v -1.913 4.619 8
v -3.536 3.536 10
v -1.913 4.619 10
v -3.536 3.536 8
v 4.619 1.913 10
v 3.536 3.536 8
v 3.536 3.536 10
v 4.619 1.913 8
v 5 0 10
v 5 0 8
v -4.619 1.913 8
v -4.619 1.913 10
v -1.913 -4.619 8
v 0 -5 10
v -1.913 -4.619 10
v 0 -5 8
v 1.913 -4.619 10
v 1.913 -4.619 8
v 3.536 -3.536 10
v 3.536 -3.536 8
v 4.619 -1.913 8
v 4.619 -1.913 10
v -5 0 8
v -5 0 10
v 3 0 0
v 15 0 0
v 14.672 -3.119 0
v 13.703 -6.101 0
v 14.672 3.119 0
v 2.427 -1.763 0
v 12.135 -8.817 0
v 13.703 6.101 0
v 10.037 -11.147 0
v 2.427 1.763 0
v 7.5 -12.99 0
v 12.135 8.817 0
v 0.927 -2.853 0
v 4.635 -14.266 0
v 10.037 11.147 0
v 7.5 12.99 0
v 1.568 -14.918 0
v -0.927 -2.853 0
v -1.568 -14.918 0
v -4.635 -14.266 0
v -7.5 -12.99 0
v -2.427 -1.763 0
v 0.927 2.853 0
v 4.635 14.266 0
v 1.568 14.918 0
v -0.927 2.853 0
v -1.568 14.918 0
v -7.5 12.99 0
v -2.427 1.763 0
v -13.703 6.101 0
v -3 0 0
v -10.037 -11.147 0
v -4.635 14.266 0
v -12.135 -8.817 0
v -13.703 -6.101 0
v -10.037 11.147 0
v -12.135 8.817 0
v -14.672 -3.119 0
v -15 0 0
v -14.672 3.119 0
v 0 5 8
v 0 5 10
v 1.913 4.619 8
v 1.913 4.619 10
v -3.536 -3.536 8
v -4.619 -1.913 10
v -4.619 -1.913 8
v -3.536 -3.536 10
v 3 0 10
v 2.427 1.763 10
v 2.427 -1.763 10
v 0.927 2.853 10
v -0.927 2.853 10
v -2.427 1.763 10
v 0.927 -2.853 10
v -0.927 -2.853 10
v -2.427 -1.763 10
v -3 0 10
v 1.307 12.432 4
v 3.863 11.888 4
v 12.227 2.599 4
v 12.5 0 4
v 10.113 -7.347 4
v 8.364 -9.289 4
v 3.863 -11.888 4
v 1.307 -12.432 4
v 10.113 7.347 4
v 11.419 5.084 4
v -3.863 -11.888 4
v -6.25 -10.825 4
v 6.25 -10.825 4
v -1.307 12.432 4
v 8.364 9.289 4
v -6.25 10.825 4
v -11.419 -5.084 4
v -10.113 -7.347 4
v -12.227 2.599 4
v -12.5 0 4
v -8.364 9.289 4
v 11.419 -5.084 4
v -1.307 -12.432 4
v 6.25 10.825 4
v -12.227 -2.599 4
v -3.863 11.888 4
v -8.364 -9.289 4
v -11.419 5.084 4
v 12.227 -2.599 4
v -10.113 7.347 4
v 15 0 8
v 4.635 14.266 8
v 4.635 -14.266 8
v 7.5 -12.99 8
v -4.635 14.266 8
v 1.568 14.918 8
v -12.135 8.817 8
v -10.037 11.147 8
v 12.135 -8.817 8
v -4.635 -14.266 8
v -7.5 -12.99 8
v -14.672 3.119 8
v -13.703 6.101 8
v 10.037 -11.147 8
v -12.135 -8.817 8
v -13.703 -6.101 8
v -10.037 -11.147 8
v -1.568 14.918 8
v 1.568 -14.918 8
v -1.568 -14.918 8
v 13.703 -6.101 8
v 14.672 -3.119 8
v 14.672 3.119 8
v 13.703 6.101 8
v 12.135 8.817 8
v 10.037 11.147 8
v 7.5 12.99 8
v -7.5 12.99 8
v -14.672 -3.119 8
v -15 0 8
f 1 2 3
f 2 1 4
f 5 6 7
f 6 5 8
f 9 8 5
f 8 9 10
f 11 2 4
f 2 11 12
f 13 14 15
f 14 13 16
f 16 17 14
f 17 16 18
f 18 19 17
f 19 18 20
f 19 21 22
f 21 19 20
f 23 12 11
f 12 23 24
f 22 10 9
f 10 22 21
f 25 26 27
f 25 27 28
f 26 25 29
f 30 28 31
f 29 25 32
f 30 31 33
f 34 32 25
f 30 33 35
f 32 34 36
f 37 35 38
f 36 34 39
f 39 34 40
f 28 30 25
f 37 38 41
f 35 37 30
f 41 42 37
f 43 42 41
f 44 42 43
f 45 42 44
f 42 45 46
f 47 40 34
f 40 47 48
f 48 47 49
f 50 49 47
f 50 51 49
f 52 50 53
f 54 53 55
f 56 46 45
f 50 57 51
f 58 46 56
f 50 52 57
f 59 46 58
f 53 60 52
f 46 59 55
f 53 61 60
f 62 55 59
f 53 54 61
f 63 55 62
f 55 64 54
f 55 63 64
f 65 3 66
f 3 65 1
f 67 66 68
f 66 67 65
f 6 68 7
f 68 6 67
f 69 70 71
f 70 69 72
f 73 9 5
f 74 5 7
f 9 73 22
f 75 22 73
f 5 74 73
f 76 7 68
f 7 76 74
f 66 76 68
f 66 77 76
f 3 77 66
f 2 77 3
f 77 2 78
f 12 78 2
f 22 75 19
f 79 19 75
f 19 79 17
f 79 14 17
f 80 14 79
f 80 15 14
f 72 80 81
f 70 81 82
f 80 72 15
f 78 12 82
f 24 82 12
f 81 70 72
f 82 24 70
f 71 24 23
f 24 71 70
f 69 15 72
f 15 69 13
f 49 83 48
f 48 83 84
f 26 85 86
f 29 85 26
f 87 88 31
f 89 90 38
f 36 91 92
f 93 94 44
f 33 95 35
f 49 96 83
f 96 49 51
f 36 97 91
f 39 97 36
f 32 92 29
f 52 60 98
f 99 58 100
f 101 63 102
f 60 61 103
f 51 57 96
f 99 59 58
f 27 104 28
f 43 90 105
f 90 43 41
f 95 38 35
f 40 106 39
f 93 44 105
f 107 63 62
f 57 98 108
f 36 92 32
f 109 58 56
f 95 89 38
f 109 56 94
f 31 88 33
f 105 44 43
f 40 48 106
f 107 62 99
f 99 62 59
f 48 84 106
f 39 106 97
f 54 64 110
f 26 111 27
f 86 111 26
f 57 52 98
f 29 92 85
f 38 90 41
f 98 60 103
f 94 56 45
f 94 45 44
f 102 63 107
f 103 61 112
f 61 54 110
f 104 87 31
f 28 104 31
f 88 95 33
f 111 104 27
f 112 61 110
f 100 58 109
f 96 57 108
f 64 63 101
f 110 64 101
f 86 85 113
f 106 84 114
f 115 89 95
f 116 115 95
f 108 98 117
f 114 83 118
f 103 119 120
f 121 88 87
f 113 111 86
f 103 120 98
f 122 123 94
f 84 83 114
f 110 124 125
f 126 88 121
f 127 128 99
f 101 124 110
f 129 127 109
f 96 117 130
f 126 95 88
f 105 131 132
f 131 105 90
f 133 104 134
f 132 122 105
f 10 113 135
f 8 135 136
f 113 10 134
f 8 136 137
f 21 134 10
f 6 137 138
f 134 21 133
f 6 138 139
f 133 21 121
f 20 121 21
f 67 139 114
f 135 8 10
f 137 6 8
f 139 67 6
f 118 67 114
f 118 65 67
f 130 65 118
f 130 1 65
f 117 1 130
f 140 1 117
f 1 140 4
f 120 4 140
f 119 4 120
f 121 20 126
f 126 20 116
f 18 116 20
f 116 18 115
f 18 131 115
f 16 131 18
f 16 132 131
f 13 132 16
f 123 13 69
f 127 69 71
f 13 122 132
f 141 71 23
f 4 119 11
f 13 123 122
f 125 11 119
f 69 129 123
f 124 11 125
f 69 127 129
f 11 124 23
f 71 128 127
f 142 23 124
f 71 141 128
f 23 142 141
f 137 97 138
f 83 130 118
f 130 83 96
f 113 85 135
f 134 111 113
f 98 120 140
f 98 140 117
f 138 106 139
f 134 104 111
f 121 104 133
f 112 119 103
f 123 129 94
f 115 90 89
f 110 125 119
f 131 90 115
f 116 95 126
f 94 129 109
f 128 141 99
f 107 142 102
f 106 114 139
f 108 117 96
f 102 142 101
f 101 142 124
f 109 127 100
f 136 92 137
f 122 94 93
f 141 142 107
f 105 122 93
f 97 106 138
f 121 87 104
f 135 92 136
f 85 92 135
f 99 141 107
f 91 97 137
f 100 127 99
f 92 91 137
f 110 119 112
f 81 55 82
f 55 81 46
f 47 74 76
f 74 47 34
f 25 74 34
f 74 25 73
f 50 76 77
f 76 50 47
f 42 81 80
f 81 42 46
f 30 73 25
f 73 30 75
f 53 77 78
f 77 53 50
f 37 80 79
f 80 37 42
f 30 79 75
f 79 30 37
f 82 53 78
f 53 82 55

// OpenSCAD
module pulley(id=6, thickness=10, d=30) {

	difference() {
		union() {
			cylinder(r=id/2+2, thickness);
			cylinder(r1=d/2, r2=d/2-thickness/4, thickness/2-1);
			translate([0,0,thickness/2-1])
			cylinder(r1=d/2-thickness/4, r2=d/2, thickness/2-1);
		}
		translate([0,0,-1])
		cylinder(r=id/2, thickness+2);
	}
}


pulley();
